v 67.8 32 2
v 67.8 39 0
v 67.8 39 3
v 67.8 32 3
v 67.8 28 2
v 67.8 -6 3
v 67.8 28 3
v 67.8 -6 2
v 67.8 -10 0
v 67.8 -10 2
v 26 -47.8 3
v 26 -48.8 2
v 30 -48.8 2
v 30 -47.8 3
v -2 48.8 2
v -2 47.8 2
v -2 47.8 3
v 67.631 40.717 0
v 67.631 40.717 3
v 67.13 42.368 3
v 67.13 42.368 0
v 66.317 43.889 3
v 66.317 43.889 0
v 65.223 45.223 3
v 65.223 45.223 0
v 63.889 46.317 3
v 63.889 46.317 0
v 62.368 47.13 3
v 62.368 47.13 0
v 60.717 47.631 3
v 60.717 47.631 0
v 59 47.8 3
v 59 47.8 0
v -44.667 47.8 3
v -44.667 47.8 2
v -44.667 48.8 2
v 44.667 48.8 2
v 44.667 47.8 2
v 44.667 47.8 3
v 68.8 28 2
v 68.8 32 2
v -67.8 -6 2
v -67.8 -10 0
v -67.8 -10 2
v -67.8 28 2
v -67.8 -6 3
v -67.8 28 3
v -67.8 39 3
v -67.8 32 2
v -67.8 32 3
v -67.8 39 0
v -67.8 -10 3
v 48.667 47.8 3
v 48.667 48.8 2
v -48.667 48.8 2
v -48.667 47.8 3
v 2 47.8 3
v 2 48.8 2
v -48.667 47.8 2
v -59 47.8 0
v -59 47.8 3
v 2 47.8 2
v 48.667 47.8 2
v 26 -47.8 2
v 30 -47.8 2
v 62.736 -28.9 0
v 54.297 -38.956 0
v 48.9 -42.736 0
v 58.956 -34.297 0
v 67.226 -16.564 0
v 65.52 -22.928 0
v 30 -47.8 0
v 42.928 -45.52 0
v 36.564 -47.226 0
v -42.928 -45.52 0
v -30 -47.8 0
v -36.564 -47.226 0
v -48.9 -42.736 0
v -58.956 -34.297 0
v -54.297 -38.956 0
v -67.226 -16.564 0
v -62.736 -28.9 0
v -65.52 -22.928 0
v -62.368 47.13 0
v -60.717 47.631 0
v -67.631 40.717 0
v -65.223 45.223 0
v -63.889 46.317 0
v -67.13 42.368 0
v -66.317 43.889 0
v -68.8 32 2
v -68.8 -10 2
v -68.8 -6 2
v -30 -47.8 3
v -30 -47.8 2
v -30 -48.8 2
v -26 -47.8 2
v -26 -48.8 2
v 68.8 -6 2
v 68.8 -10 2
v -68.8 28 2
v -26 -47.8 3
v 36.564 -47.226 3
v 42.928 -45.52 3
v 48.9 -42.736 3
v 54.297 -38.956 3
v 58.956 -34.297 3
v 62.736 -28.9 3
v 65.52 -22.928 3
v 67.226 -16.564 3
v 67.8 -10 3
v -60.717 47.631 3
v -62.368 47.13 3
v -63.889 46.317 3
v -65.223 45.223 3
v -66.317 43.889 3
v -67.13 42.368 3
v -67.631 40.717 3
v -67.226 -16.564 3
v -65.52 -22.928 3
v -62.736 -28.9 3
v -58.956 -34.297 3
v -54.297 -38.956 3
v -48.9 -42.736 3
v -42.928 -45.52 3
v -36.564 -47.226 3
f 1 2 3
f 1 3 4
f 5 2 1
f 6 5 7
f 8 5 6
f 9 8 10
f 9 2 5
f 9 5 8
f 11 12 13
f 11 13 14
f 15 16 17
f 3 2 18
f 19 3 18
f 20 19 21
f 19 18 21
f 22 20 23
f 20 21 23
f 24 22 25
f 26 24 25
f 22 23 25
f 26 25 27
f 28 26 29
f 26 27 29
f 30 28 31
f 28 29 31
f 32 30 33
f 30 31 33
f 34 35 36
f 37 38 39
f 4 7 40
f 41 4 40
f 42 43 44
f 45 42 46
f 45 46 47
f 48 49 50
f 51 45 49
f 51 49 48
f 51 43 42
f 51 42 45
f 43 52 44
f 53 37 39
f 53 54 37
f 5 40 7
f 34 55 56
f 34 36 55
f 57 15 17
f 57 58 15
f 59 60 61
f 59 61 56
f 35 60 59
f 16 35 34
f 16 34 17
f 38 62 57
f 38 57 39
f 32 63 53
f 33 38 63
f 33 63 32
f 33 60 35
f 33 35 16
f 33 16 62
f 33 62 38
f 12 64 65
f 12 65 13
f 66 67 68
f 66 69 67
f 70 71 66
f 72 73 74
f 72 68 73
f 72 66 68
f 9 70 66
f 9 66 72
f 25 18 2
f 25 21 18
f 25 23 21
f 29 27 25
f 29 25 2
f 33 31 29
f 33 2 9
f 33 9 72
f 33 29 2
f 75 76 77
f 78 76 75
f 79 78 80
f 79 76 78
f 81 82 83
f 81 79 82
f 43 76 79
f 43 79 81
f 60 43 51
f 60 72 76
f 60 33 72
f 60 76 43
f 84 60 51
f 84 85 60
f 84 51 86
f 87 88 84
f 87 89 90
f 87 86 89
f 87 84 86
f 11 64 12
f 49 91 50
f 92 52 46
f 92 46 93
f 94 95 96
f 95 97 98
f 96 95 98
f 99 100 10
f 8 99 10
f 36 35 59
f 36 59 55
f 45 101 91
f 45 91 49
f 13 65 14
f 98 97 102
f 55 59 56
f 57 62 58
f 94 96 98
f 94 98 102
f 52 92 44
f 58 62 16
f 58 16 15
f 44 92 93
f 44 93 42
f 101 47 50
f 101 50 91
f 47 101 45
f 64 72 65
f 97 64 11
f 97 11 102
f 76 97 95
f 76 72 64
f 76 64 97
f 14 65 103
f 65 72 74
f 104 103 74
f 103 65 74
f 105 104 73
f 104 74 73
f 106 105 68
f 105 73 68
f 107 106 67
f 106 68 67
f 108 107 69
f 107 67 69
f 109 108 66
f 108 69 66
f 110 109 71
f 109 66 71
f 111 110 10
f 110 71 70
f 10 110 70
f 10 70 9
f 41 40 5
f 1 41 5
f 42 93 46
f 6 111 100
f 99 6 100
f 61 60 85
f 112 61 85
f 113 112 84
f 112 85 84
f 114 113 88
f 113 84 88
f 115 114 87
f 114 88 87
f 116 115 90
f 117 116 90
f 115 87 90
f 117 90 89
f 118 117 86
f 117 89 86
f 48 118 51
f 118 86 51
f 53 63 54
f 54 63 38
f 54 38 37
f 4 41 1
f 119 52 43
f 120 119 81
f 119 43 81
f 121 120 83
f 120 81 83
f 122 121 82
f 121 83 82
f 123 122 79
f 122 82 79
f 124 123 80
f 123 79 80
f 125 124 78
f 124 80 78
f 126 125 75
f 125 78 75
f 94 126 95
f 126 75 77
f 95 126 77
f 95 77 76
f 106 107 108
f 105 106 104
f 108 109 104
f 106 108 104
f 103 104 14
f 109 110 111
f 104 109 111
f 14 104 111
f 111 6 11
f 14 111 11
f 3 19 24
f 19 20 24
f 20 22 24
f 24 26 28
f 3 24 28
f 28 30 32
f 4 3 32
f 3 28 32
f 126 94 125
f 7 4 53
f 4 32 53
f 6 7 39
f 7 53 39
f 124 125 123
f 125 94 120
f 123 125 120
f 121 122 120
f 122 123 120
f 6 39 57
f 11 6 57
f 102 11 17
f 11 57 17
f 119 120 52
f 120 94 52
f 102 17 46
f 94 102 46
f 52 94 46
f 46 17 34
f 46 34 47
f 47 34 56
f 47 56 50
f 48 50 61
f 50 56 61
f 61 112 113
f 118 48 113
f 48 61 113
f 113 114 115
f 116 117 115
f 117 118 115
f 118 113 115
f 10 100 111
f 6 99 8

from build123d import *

# Parameters (mm, degrees)
PAD001_DEPTH                    = 3
PAD003_DEPTH                    = 2
PAD003_LINEARPATTERN004_2_DEPTH = 2
LINEARPATTERN005_COUNT          = 2
LINEARPATTERN005_PITCH          = 46.666667
PAD006_DEPTH                    = 4
LINEARPATTERN010_COUNT          = 2
LINEARPATTERN010_PITCH          = 56
PAD007_DEPTH                    = 4
PAD007_LINEARPATTERN011_2_DEPTH = 4


with BuildPart() as part:
    # Sketch003 → Pad001 (new body)
    with BuildSketch(Plane.XY):
        with BuildLine():
            Line((-67.8, -10.000001), (-67.8, 39.000038))
            ThreePointArc((-59.000039, 47.8), (-65.222552, 45.222551), (-67.8, 39.000038))
            Line((-59.000039, 47.8), (59.000041, 47.8))
            ThreePointArc((67.8, 39.000041), (65.22254, 45.22254), (59.000041, 47.8))
            Line((67.8, 39.000041), (67.8, -9.999998))
            ThreePointArc((30, -47.8), (56.728637, -36.728636), (67.8, -9.999998))
            Line((30, -47.8), (-29.999999, -47.8))
            ThreePointArc((-67.8, -10.000001), (-56.728636, -36.728637), (-29.999999, -47.8))
        make_face()
    extrude(amount=PAD001_DEPTH)

    # Sketch015 → Pad003 (join, symmetric)
    with BuildSketch(Plane.YZ):
        Polygon((47.8, 3), (47.8, 2), (48.8, 2), align=None)
    pad003 = extrude(amount=PAD003_DEPTH, both=True)

    # Sketch015 LinearPattern004 2 → Pad003 LinearPattern004 2 (add, symmetric)
    with BuildSketch(Plane.YZ.offset(46.666667)):
        Polygon((47.8, 3), (47.8, 2), (48.8, 2), align=None)
    pad003_linearpattern004_2 = extrude(amount=PAD003_LINEARPATTERN004_2_DEPTH, both=True)

    # LinearPattern005: Pad003, Pad003 LinearPattern004 2 ×2
    with Locations(*[(-i * LINEARPATTERN005_PITCH, 0, 0) for i in range(1, LINEARPATTERN005_COUNT)]):
        add(pad003)
        add(pad003_linearpattern004_2)

    # Sketch020 → Pad006 (join)
    with BuildSketch(Plane.YZ.offset(-30)):
        Polygon((-47.8, 3), (-47.8, 2), (-48.8, 2), align=None)
    pad006 = extrude(amount=PAD006_DEPTH)

    # LinearPattern010: Pad006 ×2
    with Locations(*[(i * LINEARPATTERN010_PITCH, 0, 0) for i in range(1, LINEARPATTERN010_COUNT)]):
        add(pad006)

    # Sketch021 → Pad007 (join)
    with BuildSketch(Plane.XZ.offset(10)):
        Polygon((68.8, 2), (67.8, 2), (67.8, 3), align=None)
    pad007 = extrude(amount=-PAD007_DEPTH)

    # Sketch021 LinearPattern011 2 → Pad007 LinearPattern011 2 (add)
    with BuildSketch(Plane.XZ.offset(-28)):
        Polygon((68.8, 2), (67.8, 2), (67.8, 3), align=None)
    pad007_linearpattern011_2 = extrude(amount=-PAD007_LINEARPATTERN011_2_DEPTH)

    # Mirrored004: Pad007, Pad007 LinearPattern011 2 across Sketch021 V_Axis
    add(pad007.mirror(Plane(origin=(0, -10, 0), x_dir=(0, -1, 0), z_dir=(1, 0, 0))))
    add(pad007_linearpattern011_2.mirror(Plane(origin=(0, -10, 0), x_dir=(0, -1, 0), z_dir=(1, 0, 0))))


solid = part.part
